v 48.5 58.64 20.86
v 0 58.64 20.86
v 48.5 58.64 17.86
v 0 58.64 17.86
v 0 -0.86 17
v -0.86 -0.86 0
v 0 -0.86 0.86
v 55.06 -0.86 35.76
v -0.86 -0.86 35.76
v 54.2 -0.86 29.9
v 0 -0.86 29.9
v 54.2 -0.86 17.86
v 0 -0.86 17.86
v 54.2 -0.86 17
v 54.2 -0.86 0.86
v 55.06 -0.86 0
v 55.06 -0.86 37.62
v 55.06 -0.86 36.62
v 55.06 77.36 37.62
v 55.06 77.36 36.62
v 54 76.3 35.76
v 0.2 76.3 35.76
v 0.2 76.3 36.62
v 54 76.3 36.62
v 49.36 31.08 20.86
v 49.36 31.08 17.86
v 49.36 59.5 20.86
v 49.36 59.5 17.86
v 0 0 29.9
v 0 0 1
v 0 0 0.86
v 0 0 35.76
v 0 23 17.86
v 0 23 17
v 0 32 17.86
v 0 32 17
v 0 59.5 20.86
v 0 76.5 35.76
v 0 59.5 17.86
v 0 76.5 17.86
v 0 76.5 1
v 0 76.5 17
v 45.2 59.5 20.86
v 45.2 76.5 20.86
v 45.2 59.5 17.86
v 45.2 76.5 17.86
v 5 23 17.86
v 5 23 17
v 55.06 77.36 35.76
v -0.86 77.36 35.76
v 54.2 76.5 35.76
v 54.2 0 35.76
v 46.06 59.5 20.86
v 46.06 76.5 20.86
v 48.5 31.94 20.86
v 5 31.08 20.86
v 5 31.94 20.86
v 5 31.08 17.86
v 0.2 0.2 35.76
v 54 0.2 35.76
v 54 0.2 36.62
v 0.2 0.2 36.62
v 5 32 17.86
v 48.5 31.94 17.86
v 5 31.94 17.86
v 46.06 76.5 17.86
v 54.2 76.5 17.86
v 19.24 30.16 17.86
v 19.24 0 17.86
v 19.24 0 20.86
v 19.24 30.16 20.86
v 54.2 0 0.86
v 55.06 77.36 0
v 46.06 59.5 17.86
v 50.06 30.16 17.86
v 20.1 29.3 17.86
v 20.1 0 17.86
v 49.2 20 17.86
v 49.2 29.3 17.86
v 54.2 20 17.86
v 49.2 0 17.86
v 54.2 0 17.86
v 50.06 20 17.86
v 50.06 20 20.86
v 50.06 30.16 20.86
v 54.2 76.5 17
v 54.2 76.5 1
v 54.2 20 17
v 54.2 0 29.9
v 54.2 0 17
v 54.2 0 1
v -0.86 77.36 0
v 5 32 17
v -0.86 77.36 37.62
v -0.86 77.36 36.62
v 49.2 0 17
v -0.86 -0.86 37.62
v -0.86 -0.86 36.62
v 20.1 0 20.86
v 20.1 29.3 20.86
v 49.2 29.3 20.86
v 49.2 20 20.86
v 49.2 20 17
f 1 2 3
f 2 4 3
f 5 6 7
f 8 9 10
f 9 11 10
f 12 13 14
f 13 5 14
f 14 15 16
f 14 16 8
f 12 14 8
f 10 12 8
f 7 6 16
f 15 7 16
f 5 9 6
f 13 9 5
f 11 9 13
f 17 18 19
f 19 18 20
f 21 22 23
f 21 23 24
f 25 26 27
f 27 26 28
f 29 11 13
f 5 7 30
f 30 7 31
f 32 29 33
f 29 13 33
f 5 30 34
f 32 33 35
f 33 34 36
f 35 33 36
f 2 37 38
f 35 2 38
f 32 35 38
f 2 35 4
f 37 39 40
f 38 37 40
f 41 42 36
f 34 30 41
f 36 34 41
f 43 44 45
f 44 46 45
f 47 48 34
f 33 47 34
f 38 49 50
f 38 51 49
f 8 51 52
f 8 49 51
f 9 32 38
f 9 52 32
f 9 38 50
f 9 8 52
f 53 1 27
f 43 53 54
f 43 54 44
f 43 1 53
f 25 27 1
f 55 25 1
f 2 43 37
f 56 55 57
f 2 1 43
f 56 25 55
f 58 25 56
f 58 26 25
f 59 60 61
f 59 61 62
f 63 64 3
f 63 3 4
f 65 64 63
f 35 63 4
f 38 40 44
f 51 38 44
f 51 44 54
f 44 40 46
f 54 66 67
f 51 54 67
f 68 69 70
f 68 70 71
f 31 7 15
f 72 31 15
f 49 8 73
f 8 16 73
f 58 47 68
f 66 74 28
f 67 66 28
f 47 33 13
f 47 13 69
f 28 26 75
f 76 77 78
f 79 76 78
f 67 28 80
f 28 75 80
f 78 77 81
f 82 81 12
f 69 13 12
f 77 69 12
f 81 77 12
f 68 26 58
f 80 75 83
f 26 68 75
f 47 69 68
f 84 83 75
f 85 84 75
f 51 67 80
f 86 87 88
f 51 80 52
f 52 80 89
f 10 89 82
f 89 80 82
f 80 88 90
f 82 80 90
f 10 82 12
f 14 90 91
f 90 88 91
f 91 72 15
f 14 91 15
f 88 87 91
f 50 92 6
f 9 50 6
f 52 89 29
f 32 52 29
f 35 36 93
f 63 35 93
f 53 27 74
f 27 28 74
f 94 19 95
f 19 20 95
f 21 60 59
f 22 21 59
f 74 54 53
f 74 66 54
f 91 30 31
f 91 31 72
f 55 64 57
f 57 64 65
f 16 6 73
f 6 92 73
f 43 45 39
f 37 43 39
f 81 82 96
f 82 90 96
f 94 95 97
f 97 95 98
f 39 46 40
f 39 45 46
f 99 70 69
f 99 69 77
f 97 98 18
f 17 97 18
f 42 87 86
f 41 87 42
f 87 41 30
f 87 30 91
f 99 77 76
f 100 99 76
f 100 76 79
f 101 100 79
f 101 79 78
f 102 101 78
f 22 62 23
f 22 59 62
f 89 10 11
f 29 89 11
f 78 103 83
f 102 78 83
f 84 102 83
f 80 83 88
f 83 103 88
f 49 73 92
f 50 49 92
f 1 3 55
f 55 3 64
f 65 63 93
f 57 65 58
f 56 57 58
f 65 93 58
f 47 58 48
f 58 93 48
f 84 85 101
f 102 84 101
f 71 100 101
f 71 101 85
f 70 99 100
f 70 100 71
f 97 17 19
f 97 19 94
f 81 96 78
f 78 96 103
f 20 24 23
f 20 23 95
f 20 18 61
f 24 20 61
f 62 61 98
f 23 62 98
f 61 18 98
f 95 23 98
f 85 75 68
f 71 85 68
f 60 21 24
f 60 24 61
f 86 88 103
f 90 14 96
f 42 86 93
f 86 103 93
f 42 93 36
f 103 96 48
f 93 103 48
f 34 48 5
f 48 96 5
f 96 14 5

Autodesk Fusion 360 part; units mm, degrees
sketch "Sketch1" plane through (0, 0, 0) normal (0, 0, 1) x (1, 0, 0)
  line L0 (0, 0) -> (54.2, 0)
  line L1 (54.2, 0) -> (54.2, 76.5)
  line L2 (54.2, 76.5) -> (0, 76.5)
  line L3 (0, 76.5) -> (0, 0)
  line L4 (-0.86, -0.86) -> (55.06, -0.86)
  line L5 (55.06, -0.86) -> (55.06, 77.36)
  line L6 (55.06, 77.36) -> (-0.86, 77.36)
  line L7 (-0.86, 77.36) -> (-0.86, -0.86)
  dimension "d1" = 54.2
  dimension "d2" = 76.5
  dimension "d5" = 0.86
extrude "Extrude2" add sketch "Sketch1" along normal blind 17 makes body 1
extrude "Extrude3" add sketch "Sketch1" along normal blind 1 contours L0 L1 L2 L3 bodies 1
sketch "Sketch2" plane through (0, 0, 17) normal (0, 0, 1) x (-1, 0, 0)
  line L0 (0, 0) -> (0, -76.5)
  line L1 (0, -76.5) -> (-54.2, -76.5)
  line L2 (-54.2, -76.5) -> (-54.2, 0)
  line L3 (-54.2, 0) -> (0, 0)
  line L4 (0.86, -77.36) -> (0.86, 0.86)
  line L5 (0.86, 0.86) -> (-55.06, 0.86)
  line L6 (-55.06, 0.86) -> (-55.06, -77.36)
  line L7 (-55.06, -77.36) -> (0.86, -77.36)
  line L8 (0.86, 0.86) -> (-55.06, 0.86)
  line L9 (-55.06, 0.86) -> (-55.06, -77.36)
  line L10 (-55.06, -77.36) -> (0.86, -77.36)
  line L11 (0.86, -77.36) -> (0.86, 0.86)
  line L12 (0, 0) -> (-54.2, 0)
  line L13 (-54.2, 0) -> (-54.2, -76.5)
  line L14 (-54.2, -76.5) -> (0, -76.5)
  line L15 (0, -76.5) -> (0, 0)
  line L16 (0, 0) -> (-5, 0)
  line L17 (-5, -23) -> (0, -23)
  line L18 (0, -23) -> (0, 0)
  line L19 (-5, -23) -> (0, -23)
  line L20 (0, -23) -> (0, -32)
  line L21 (0, -32) -> (-5, -32)
  line L22 (-5, -32) -> (-5, -23)
  line L23 (-54.2, 0) -> (-49.2, 0)
  line L24 (-49.2, 0) -> (-49.2, -20)
  line L25 (-49.2, -20) -> (-54.2, -20)
  line L26 (-54.2, -20) -> (-54.2, 0)
  dimension "d10" = -0.86
  dimension "d11" = 5
  dimension "d12" = 23
  dimension "d13" = 9
  dimension "d14" = 5
  dimension "d15" = 20
extrude "Extrude4" add sketch "Sketch2" along normal blind 0.86 separate body contours L0 L1 L2 L3 L12 L13 L14 L15 L16 L17 L18 L19 L21 L22 L24 L25 makes body 2
extrude "Extrude5" add 1 faces at (-0.5733, 51, 17) along direction (0, 0, 1) blind 0.86 on bodies 1 bodies 1 2
sketch "Sketch3" plane through (0, -0.86, 0) normal (0, -1, 0) x (1, 0, 0)
  line L0 (-0.86, 0) -> (55.06, 0)
  line L1 (55.06, 0) -> (55.06, 17.86)
  line L2 (55.06, 17.86) -> (-0.86, 17.86)
  line L3 (-0.86, 17.86) -> (-0.86, 0)
  line L4 (-0.86, 0) -> (55.06, 0)
  line L5 (55.06, 0) -> (55.06, 17.86)
  line L6 (55.06, 17.86) -> (-0.86, 17.86)
  line L7 (-0.86, 17.86) -> (-0.86, 0)
  line L8 (0, 0.86) -> (54.2, 0.86)
  line L9 (54.2, 0.86) -> (54.2, 17)
  line L10 (54.2, 17) -> (0, 17)
  line L11 (0, 17) -> (0, 0.86)
  dimension "d20" = -0.86
extrude "Extrude6" cut sketch "Sketch3" against normal blind 0.86 contours L8 L9 L10 L11 bodies 1
sketch "Sketch12" plane through (0, 0, 17.86) normal (0, 0, 1) x (-1, 0, 0)
  line L0 (-49.2, 0) -> (-49.2, -20)
  line L1 (-49.2, -20) -> (-54.2, -20)
  line L2 (-54.2, -20) -> (-54.2, 0)
  line L3 (-54.2, 0) -> (-49.2, 0)
  line L4 (0.86, -77.36) -> (0.86, 0.86)
  line L5 (0.86, 0.86) -> (-55.06, 0.86)
  line L6 (-55.06, 0.86) -> (-55.06, -77.36)
  line L7 (-55.06, -77.36) -> (0.86, -77.36)
  line L8 (0, -23) -> (0, -32)
  line L9 (0, -32) -> (-5, -32)
  line L10 (-5, -32) -> (-5, -23)
  line L11 (-5, -23) -> (0, -23)
  line L12 (0.86, -77.36) -> (-55.06, -77.36)
  line L13 (-55.06, -77.36) -> (-55.06, 0.86)
  line L14 (0.86, 0.86) -> (0.86, -77.36)
  line L15 (-54.2, 0) -> (0, 0)
  line L16 (0, 0) -> (0, -76.5)
  line L17 (0, -76.5) -> (-54.2, -76.5)
  line L18 (-54.2, -76.5) -> (-54.2, 0)
  line L19 (0, -76.5) -> (-45.2, -76.5)
  line L20 (-45.2, -76.5) -> (-45.2, -59.5)
  line L21 (-45.2, -59.5) -> (0, -59.5)
  line L22 (0, -59.5) -> (0, -76.5)
  line L23 (-46.06, -76.5) -> (-46.06, -59.5)
  line L24 (-45.2, -58.64) -> (0, -58.64)
  line L25 (-45.2, -58.64) -> (-46.06, -58.64)
  line L26 (0, -58.64) -> (-48.5, -58.64)
  line L27 (-48.5, -58.64) -> (-48.5, -32.64)
  line L28 (0, -32.64) -> (0, -58.64)
  line L29 (0, -58.64) -> (-48.5, -58.64)
  line L30 (-48.5, -58.64) -> (-48.5, -31.94)
  line L31 (-48.5, -31.94) -> (0, -31.94)
  line L32 (0, -31.94) -> (0, -58.64)
  line L33 (-49.36, -58.64) -> (-49.36, -32.64)
  line L34 (-48.5, -31.08) -> (-5, -31.08)
  line L35 (-49.36, -32.64) -> (-49.36, -31.08)
  line L36 (-49.36, -31.08) -> (-48.5, -31.08)
  line L37 (-49.36, -58.64) -> (-49.36, -59.5)
  line L38 (-49.36, -59.5) -> (-46.06, -59.5)
  line L39 (-49.2, 0) -> (-20.1, 0)
  line L40 (-20.1, 0) -> (-20.1, -29.3)
  line L41 (-20.1, -29.3) -> (-49.2, -29.3)
  line L42 (-49.2, -29.3) -> (-49.2, 0)
  line L43 (-20.1, -30.16) -> (-49.2, -30.16)
  line L44 (-19.24, 0) -> (-19.24, -29.3)
  line L45 (-50.06, -29.3) -> (-50.06, -20)
  line L46 (-50.06, -29.3) -> (-50.06, -30.16)
  line L47 (-50.06, -30.16) -> (-49.2, -30.16)
  line L48 (-20.1, -30.16) -> (-19.24, -30.16)
  line L49 (-19.24, -30.16) -> (-19.24, -29.3)
  dimension "d40" = 0.86
  dimension "d41" = 45.2
  dimension "d42" = 17
  dimension "d43" = -0.86
  dimension "d44" = -0.86
  dimension "d45" = 48.5
  dimension "d47" = 48.5
  dimension "d52" = -0.86
  dimension "d53" = -0.86
  dimension "d54" = 29.1
  dimension "d55" = 29.3
  dimension "d56" = -0.86
  dimension "d57" = -0.86
  dimension "d58" = -0.86
extrude "Extrude10" add sketch "Sketch12" along normal blind 17.9 bodies 1
extrude "Extrude11" add sketch "Sketch12" along normal blind 3 contours L1 L15 L40 L41 L42 L43 L44 L45 L46 L47 L48 L49 | L10 L16 L17 L20 L21 L23 L24 L25 L26 L27 L29 L30 L31 L33 L34 L35 L36 L37 L38 bodies 1
sketch "Sketch13" plane through (0, -0.86, 0) normal (0, -1, 0) x (1, 0, 0)
  line L0 (54.2, 0.86) -> (0, 0.86)
  line L1 (0, 0.86) -> (0, 17)
  line L2 (0, 17) -> (54.2, 17)
  line L3 (54.2, 17) -> (54.2, 0.86)
  line L4 (-0.86, 0) -> (55.06, 0)
  line L5 (55.06, 0) -> (55.06, 35.76)
  line L6 (55.06, 35.76) -> (-0.86, 35.76)
  line L7 (-0.86, 35.76) -> (-0.86, 0)
  line L8 (54.2, 17) -> (54.2, 29.9)
  line L9 (54.2, 35.76) -> (0, 35.76)
  line L10 (0, 29.9) -> (0, 17)
  line L11 (54.2, 29.9) -> (0, 29.9)
  line L12 (0, 17) -> (54.2, 17)
  line L13 (0, 17.86) -> (54.2, 17.86)
  dimension "d65" = -0.86
extrude "Extrude12" cut sketch "Sketch13" against normal blind 0.86 contours L8 L10 L11 L13 bodies 1
sketch "Sketch14" plane through (0, 0, 35.76) normal (0, 0, 1) x (-1, 0, 0)
  line L0 (-54.2, 0) -> (0, 0)
  line L1 (0, 0) -> (0, -76.5)
  line L2 (0, -76.5) -> (-54.2, -76.5)
  line L3 (-54.2, -76.5) -> (-54.2, 0)
  line L4 (0.86, 0.86) -> (-55.06, 0.86)
  line L5 (-55.06, 0.86) -> (-55.06, -77.36)
  line L6 (-55.06, -77.36) -> (0.86, -77.36)
  line L7 (0.86, -77.36) -> (0.86, 0.86)
  line L8 (0, -76.5) -> (-54.2, -76.5)
  line L9 (-54.2, -76.5) -> (-54.2, 0)
  line L10 (-54.2, 0) -> (0, 0)
  line L11 (0, 0) -> (0, -76.5)
  line L12 (-0.2, -76.3) -> (-54, -76.3)
  line L13 (-54, -76.3) -> (-54, -0.2)
  line L14 (-54, -0.2) -> (-0.2, -0.2)
  line L15 (-0.2, -0.2) -> (-0.2, -76.3)
  dimension "d68" = 0.2
extrude "Extrude13" add sketch "Sketch14" along normal blind 0.86 separate body contours L12 L13 L14 L15 makes body 3
sketch "Sketch15" plane through (0, 0, 36.62) normal (0, 0, 1) x (-1, 0, 0)
  line L0 (-0.2, -0.2) -> (-54, -0.2)
  line L1 (-54, -0.2) -> (-54, -76.3)
  line L2 (-54, -76.3) -> (-0.2, -76.3)
  line L3 (-0.2, -76.3) -> (-0.2, -0.2)
  line L4 (-55.06, -77.36) -> (0.86, -77.36)
  line L5 (0.86, -77.36) -> (0.86, 0.86)
  line L6 (0.86, 0.86) -> (-55.06, 0.86)
  line L7 (-55.06, 0.86) -> (-55.06, -77.36)
  dimension "d71" = 1.06
extrude "Extrude14" add sketch "Sketch15" along normal blind 1 contours L0 L1 L2 L3 | L4 L5 L6 L7 bodies 3
equation "d71 = 0.86 mm + 0.2 mm"
